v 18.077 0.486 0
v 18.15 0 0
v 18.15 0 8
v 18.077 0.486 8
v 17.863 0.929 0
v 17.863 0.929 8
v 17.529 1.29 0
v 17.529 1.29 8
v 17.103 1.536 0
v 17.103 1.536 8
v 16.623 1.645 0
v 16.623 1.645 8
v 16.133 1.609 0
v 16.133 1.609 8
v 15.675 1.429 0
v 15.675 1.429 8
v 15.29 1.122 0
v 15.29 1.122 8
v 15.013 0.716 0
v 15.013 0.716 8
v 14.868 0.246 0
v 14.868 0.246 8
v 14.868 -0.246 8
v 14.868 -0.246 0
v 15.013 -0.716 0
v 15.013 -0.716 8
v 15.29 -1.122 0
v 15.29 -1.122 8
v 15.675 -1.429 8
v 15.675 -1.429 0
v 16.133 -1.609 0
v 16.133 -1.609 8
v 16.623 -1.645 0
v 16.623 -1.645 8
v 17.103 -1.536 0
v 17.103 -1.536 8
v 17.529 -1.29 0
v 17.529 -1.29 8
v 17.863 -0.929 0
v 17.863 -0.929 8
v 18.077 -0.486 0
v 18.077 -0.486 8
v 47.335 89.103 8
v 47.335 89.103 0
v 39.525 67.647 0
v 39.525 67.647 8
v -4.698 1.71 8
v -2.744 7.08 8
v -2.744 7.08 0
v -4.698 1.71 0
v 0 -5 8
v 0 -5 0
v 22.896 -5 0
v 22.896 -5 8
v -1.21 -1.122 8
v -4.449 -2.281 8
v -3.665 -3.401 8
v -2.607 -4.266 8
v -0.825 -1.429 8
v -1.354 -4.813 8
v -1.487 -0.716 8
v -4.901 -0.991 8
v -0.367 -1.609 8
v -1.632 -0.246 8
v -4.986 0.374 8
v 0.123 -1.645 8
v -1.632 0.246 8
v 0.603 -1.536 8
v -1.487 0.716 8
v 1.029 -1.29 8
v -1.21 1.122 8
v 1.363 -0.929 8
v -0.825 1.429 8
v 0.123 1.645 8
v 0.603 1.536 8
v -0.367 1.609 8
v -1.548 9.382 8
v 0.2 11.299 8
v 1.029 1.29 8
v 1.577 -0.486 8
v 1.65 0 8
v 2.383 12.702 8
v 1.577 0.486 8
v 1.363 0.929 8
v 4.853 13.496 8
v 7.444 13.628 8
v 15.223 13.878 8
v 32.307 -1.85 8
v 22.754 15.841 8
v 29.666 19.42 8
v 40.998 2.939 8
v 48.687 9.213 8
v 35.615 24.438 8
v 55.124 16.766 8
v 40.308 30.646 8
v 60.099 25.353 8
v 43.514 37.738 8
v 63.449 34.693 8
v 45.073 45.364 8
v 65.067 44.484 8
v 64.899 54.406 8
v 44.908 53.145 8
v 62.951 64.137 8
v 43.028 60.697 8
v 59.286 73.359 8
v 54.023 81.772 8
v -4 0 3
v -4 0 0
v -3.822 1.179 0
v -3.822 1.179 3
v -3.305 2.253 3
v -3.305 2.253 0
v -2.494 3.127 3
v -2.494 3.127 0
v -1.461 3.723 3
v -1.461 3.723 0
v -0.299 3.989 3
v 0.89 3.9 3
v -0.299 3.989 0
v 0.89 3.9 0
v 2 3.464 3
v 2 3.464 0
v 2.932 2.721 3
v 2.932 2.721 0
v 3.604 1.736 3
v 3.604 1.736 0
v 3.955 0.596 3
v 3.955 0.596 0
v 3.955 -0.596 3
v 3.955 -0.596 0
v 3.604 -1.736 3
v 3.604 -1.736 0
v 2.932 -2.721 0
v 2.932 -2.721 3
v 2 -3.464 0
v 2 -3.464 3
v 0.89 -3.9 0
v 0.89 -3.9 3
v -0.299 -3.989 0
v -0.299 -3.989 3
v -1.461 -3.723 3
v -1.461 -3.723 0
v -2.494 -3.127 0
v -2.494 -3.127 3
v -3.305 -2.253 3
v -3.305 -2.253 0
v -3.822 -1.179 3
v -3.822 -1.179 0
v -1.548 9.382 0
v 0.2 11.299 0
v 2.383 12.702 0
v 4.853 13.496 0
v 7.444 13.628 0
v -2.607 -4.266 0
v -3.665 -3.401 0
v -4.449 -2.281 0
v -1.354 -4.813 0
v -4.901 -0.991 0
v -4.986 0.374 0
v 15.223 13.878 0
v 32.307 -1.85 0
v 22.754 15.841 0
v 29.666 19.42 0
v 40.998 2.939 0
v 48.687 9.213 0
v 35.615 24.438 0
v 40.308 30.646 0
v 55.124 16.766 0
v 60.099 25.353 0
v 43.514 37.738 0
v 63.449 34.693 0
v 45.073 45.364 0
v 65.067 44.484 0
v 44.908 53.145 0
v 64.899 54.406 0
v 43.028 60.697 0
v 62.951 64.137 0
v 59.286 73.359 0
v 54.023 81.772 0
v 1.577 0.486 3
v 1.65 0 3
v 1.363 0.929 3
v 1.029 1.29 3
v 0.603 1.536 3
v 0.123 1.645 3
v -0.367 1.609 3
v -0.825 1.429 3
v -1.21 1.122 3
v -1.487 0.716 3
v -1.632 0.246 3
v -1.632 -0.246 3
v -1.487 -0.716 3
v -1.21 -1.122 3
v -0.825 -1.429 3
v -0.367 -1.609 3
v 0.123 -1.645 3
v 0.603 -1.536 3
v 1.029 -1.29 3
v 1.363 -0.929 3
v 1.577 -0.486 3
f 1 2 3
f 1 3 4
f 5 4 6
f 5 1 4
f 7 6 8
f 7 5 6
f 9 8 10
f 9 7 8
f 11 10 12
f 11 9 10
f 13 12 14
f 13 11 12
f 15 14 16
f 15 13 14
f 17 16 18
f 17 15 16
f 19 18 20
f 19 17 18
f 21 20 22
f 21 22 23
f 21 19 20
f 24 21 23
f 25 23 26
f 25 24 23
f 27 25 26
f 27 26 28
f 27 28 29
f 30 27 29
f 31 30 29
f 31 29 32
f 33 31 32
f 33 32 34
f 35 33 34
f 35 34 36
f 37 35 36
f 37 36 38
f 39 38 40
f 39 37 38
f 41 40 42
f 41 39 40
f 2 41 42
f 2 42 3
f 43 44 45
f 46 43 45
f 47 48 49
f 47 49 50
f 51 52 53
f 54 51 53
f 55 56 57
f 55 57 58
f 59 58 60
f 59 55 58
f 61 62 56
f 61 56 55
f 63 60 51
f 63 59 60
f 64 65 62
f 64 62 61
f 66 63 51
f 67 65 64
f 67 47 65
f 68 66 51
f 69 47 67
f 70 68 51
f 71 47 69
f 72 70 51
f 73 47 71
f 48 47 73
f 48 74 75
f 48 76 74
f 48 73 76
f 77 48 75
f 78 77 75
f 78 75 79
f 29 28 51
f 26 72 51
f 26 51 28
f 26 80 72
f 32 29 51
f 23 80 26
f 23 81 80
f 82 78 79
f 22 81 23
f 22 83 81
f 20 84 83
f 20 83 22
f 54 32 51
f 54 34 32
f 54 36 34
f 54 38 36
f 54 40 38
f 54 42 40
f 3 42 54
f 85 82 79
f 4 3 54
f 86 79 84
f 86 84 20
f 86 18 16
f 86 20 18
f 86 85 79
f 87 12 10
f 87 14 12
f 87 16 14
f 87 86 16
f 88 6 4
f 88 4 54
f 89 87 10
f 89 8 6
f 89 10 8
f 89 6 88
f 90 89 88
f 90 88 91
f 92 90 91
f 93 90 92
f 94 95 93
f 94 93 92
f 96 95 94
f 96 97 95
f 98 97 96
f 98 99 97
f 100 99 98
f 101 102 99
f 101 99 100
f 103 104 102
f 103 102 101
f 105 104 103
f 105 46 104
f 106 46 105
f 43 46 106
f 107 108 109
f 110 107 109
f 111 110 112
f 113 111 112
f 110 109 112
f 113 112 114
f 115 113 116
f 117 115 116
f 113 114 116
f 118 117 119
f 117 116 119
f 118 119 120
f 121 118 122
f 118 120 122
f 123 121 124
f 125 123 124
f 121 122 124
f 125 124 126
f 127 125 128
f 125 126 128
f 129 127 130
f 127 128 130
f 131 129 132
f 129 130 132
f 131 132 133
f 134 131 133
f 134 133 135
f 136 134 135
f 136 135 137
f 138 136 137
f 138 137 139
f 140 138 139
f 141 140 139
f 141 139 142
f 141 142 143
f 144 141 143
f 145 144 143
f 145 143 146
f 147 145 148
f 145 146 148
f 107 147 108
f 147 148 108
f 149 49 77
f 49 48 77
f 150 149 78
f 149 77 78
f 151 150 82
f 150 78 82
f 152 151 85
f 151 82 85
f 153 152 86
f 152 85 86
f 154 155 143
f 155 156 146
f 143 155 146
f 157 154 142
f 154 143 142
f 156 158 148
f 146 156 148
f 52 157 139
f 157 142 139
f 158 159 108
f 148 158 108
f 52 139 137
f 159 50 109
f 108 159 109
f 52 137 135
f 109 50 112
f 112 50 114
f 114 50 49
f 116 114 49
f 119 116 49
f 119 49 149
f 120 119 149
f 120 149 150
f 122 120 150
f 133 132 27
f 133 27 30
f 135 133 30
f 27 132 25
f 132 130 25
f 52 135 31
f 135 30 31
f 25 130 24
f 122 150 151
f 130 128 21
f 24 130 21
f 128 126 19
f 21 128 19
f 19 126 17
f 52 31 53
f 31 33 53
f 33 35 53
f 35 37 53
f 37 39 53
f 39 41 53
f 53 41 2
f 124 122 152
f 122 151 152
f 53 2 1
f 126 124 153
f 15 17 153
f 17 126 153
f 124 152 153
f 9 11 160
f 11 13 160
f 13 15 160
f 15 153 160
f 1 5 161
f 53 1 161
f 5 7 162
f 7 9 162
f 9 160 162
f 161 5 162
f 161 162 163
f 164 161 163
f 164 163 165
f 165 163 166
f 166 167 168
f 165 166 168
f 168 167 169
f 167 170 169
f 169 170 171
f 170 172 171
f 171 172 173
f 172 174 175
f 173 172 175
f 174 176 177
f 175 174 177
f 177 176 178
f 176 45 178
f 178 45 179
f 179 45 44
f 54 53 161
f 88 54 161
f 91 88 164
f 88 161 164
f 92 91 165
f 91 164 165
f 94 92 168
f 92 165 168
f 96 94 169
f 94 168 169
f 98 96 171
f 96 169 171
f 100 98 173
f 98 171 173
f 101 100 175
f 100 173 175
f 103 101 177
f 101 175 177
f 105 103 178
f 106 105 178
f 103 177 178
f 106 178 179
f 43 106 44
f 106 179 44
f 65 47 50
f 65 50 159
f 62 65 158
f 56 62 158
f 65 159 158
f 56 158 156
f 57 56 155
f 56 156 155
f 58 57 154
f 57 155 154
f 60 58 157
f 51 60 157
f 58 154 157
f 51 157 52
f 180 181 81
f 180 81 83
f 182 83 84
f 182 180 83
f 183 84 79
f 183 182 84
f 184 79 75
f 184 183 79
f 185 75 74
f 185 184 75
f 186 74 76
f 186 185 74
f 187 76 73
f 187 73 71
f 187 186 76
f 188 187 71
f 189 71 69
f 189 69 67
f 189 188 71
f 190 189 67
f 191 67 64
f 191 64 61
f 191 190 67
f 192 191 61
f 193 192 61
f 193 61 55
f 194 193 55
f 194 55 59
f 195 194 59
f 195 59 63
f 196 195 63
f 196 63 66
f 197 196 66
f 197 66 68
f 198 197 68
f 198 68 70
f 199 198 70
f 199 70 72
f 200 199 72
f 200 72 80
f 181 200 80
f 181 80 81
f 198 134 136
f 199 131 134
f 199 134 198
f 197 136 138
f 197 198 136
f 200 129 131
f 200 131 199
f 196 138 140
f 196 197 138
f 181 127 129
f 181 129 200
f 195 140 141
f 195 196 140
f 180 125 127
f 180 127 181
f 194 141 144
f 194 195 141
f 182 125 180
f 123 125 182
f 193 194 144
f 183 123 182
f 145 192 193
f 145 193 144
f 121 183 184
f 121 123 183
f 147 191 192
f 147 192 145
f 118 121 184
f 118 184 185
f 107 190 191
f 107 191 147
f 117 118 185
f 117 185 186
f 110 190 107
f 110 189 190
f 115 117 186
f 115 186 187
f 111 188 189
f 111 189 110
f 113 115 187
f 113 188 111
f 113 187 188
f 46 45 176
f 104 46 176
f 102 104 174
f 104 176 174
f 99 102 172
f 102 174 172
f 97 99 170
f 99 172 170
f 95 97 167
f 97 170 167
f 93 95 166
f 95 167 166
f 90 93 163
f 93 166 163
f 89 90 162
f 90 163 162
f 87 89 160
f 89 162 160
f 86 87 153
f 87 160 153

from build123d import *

# Parameters (mm, degrees)
SKETCH_1_R          = 1.65
EXTRUDE_1_DEPTH     = 8
FILLET_1_R          = 10
SKETCH_2_R          = 4
CUT_EXTRUDE_1_DEPTH = 3


with BuildPart() as part:
    # 草圖1 → 填料-伸長1 (new body)
    with BuildSketch(Plane.XY):
        with BuildLine():
            Line((0, -5), (22.896270517, -5))
            ThreePointArc((22.896270517, -5), (63.449308727, 34.693340668), (47.334627368, 89.103149031))
            Line((47.334627368, 89.103149031), (39.525260877, 67.647090937))
            ThreePointArc((39.525260877, 67.647090937), (38.24035653, 27.551768918), (0.138664652, 15))
            Line((0.138664652, 15), (-4.698463104, 1.710100717))
            ThreePointArc((-4.698463104, 1.710100717), (-4.095760221, -2.867882182), (0, -5))
        make_face()
        Circle(SKETCH_1_R, mode=Mode.SUBTRACT)
        with Locations((16.5, 0)):
            Circle(SKETCH_1_R, mode=Mode.SUBTRACT)
    extrude(amount=EXTRUDE_1_DEPTH)

    # 圓角1
    fillet_1_edges = [part.edges().sort_by_distance(p)[0] for p in [
        (0.138664652, 15, 4),
    ]]
    fillet(fillet_1_edges, radius=FILLET_1_R)

    # 草圖2 → 除料-伸長1 (cut)
    with BuildSketch(Plane(origin=(0, 0, 0), x_dir=(-1, 0, 0), z_dir=(0, 0, -1))):
        Circle(SKETCH_2_R)
    extrude(amount=-CUT_EXTRUDE_1_DEPTH, mode=Mode.SUBTRACT)


solid = part.part
